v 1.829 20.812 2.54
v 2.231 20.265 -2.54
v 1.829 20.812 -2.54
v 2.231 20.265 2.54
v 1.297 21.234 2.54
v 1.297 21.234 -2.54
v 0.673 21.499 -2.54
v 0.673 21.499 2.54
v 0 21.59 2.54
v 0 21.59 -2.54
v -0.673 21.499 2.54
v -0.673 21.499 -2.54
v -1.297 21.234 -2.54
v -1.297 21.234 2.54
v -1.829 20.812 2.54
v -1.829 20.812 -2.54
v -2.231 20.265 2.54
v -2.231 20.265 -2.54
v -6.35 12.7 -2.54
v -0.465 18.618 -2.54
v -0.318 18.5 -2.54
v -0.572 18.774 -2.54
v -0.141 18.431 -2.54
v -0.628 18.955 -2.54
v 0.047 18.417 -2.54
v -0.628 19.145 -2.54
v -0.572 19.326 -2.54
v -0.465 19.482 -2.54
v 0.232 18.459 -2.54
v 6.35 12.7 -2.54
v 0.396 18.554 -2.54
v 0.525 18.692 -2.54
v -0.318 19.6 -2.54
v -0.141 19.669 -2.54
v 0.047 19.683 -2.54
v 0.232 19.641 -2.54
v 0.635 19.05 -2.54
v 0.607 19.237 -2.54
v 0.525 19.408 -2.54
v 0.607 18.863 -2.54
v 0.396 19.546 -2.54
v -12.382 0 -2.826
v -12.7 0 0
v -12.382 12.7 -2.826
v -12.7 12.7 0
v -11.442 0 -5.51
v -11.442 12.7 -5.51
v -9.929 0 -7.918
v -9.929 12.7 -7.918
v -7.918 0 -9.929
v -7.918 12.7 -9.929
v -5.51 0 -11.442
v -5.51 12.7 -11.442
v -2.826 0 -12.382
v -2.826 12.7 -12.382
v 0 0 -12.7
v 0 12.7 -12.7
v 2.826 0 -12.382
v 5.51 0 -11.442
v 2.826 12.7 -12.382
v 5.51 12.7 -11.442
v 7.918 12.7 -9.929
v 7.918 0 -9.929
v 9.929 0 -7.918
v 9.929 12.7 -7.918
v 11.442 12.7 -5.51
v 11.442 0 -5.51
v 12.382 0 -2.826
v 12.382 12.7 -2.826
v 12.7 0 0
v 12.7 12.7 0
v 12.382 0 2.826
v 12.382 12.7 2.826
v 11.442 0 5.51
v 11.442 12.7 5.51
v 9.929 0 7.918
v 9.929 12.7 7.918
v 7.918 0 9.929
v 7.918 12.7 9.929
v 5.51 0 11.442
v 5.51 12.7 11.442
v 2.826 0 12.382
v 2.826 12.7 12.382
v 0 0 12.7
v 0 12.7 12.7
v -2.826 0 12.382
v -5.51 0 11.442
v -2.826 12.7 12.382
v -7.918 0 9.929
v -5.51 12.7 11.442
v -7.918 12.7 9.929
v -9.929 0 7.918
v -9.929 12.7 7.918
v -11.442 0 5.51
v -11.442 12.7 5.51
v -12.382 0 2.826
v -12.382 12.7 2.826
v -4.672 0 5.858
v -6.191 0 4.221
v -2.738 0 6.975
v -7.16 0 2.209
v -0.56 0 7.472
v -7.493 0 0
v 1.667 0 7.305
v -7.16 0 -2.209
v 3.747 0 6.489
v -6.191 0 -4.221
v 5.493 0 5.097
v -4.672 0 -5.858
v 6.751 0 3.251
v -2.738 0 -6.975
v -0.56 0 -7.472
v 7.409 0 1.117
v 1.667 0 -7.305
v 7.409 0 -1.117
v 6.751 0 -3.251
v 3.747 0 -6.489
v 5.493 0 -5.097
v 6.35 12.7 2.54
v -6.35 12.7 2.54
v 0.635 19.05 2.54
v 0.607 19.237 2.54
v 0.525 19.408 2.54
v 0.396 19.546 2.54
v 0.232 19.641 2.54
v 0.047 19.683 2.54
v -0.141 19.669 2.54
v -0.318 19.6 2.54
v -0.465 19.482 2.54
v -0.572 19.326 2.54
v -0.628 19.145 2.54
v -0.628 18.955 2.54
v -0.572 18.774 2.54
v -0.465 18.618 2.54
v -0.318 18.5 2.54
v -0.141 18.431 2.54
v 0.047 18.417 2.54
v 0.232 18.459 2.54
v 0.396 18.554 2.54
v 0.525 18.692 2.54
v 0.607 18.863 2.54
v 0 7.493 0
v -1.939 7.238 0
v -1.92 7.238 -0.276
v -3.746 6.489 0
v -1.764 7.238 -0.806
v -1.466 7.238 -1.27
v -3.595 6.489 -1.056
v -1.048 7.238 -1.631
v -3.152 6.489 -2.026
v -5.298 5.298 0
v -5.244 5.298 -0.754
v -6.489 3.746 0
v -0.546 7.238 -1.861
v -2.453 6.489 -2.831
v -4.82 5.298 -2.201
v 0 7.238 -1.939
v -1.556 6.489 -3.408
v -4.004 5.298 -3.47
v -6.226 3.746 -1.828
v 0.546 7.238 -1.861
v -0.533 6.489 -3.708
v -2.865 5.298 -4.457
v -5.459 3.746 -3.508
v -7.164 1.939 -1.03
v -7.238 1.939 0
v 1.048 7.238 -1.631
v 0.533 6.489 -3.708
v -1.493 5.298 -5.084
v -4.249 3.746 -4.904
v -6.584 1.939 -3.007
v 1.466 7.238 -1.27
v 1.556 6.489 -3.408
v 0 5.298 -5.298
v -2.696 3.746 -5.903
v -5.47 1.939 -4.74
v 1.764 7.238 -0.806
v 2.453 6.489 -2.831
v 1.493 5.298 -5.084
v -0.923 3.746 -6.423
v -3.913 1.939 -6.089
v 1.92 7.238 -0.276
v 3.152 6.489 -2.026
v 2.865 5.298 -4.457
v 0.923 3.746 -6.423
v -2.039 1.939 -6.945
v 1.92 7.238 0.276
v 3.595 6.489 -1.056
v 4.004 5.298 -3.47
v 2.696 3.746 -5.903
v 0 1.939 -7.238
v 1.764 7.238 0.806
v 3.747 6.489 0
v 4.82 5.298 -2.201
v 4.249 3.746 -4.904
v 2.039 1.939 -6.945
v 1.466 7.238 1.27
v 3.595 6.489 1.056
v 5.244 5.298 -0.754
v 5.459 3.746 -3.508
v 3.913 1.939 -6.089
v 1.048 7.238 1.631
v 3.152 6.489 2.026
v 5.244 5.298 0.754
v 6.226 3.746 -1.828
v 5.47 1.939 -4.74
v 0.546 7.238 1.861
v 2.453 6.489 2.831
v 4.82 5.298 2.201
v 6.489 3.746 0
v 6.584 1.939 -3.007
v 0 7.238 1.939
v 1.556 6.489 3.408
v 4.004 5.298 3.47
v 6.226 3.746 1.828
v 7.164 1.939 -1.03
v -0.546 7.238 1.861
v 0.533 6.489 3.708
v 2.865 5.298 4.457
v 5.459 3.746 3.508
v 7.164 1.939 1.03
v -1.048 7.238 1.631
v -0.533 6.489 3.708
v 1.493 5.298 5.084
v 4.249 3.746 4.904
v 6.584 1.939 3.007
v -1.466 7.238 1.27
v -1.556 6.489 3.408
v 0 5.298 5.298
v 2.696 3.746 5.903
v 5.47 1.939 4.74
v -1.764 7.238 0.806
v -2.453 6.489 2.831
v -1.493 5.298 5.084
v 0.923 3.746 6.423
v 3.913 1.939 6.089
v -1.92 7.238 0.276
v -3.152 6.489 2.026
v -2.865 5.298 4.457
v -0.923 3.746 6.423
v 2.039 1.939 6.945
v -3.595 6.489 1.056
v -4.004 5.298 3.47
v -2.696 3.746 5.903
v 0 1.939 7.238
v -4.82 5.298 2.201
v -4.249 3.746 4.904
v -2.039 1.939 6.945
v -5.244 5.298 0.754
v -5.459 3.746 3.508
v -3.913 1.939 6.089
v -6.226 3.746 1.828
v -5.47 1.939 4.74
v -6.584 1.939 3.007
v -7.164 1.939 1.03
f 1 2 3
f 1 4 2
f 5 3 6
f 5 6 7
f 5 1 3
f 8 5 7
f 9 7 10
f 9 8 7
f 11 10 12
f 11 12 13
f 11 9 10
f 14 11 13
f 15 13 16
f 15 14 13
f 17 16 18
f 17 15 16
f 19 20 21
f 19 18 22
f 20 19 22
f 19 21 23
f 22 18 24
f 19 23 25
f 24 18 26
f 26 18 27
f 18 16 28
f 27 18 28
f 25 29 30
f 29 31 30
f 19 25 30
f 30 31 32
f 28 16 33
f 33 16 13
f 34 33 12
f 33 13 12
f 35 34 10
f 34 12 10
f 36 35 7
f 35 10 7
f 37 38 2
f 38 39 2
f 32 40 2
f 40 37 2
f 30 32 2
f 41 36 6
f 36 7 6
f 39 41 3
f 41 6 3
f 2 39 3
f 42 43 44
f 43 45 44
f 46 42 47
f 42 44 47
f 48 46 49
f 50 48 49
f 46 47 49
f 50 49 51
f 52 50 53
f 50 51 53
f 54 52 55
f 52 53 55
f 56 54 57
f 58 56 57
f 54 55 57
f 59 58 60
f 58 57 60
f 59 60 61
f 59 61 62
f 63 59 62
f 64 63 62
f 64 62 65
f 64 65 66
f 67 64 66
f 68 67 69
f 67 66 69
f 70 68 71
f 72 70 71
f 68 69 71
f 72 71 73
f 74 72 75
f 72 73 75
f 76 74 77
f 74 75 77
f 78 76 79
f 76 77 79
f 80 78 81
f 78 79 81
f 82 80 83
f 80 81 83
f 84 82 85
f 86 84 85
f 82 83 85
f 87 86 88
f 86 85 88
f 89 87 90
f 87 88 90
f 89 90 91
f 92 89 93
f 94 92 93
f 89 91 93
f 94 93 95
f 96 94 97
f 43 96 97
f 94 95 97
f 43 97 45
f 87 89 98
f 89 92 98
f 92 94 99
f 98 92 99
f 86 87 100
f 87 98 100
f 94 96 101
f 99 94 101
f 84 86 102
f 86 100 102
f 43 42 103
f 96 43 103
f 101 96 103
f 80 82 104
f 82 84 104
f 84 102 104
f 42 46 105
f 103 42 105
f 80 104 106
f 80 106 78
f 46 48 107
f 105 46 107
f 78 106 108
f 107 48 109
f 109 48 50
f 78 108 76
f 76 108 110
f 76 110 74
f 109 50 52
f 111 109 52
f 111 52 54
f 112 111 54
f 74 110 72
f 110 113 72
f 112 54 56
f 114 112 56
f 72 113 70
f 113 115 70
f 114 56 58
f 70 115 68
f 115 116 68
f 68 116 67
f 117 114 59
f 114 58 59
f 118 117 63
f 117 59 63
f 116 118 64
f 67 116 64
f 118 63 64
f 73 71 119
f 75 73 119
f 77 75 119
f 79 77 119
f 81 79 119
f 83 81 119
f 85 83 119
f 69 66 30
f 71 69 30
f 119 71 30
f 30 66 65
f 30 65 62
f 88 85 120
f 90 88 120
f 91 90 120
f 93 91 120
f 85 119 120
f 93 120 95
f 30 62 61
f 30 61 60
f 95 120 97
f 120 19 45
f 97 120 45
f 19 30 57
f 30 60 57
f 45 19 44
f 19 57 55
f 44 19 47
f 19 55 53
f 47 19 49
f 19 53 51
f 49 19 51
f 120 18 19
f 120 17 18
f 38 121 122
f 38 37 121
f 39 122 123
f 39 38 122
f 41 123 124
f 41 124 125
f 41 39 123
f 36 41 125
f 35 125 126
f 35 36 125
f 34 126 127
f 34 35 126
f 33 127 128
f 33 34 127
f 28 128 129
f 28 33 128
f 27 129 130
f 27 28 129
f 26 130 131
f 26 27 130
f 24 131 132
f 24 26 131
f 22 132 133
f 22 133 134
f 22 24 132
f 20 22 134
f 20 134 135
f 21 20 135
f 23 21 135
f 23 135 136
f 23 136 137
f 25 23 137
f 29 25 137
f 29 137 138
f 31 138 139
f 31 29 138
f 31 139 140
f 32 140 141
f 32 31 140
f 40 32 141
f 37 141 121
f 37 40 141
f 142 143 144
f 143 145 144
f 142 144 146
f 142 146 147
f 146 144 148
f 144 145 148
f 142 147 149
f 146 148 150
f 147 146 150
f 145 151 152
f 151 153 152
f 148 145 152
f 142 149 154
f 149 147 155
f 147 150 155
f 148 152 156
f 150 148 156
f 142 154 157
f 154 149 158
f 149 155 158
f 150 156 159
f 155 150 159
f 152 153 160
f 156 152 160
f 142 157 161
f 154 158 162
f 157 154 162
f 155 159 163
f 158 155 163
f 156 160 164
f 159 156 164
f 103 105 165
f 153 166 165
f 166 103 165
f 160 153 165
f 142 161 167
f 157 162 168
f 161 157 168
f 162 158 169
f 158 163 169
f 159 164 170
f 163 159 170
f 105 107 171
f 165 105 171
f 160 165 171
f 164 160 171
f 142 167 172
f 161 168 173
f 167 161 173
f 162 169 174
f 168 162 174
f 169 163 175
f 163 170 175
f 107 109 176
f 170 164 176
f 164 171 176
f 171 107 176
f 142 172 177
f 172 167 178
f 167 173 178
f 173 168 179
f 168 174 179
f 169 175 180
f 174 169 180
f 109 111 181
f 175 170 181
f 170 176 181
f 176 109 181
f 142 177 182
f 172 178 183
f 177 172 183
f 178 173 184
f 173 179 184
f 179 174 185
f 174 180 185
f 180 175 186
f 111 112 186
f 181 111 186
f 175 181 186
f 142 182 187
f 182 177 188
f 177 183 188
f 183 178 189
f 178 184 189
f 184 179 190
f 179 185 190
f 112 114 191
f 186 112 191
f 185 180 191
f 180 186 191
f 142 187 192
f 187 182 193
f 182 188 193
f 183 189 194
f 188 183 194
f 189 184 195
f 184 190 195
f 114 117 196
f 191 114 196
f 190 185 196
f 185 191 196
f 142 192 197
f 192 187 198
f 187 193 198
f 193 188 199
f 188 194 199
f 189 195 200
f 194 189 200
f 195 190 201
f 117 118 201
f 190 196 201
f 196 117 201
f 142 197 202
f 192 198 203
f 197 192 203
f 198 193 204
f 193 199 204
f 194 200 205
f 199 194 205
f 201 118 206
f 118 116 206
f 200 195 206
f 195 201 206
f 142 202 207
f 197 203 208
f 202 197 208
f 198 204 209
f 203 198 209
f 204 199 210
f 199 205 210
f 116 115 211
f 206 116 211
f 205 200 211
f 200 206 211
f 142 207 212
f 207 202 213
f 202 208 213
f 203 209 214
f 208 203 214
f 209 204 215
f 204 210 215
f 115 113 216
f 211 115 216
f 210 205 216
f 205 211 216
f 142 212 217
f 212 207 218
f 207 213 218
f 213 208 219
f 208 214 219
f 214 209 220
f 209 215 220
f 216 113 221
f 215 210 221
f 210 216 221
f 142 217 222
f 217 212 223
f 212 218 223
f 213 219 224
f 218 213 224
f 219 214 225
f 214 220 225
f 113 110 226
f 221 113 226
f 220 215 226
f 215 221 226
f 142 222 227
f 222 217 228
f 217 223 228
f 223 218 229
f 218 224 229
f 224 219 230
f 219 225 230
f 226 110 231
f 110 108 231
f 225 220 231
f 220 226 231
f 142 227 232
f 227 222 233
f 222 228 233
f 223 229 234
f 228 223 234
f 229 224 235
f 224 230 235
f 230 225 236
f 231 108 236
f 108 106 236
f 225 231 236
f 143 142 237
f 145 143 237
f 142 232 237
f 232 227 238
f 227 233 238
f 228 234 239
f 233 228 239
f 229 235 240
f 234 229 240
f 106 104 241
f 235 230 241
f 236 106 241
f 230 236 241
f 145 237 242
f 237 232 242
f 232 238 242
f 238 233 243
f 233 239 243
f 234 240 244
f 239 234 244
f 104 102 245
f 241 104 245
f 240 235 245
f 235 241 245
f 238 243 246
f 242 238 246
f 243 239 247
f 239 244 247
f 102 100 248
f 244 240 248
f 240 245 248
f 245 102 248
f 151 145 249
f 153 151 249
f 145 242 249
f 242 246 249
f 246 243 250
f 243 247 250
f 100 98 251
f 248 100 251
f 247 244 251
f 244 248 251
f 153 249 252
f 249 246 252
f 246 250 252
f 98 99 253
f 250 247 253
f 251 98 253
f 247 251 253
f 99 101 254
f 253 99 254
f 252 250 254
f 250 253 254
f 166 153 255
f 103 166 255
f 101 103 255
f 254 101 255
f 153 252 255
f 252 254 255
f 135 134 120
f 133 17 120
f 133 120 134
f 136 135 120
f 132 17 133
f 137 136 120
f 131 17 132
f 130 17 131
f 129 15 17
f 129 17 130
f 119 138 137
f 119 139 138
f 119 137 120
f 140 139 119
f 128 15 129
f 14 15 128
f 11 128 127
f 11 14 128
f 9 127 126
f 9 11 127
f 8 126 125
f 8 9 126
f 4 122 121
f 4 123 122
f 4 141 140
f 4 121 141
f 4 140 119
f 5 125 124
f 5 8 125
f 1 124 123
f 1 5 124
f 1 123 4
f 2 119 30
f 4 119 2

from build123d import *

# Parameters (mm, degrees)
SKETCH2_R           = 0.635
BOSS_EXTRUDE1_DEPTH = 2.54


with BuildPart() as part:
    # Sketch1 → Revolve1 (revolve)
    with BuildSketch(Plane.XY, mode=Mode.PRIVATE) as revolve1_sk:
        with BuildLine():
            Line((7.493, 0), (12.7, 0))
            Line((12.7, 0), (12.7, 12.7))
            Line((12.7, 12.7), (0, 12.7))
            Line((0, 12.7), (0, 7.493))
            ThreePointArc((0, 7.493), (5.298351111, 5.298351111), (7.493, 0))
        make_face()
    revolve(revolve1_sk.sketch.rotate(Axis((0, 12.7, 0), (0, -1, 0)), 180), axis=Axis((0, 12.7, 0), (0, -1, 0)))

    # Sketch2 → Boss-Extrude1 (add, symmetric)
    with BuildSketch(Plane.XY):
        with BuildLine():
            Line((-2.230711816, 20.264711816), (-6.35, 12.7))
            Line((-6.35, 12.7), (6.35, 12.7))
            Line((6.35, 12.7), (2.230711816, 20.264711816))
            ThreePointArc((2.230711816, 20.264711816), (0, 21.59), (-2.230711816, 20.264711816))
        make_face()
        with Locations((0, 19.05)):
            Circle(SKETCH2_R, mode=Mode.SUBTRACT)
    extrude(amount=BOSS_EXTRUDE1_DEPTH, both=True)


solid = part.part
